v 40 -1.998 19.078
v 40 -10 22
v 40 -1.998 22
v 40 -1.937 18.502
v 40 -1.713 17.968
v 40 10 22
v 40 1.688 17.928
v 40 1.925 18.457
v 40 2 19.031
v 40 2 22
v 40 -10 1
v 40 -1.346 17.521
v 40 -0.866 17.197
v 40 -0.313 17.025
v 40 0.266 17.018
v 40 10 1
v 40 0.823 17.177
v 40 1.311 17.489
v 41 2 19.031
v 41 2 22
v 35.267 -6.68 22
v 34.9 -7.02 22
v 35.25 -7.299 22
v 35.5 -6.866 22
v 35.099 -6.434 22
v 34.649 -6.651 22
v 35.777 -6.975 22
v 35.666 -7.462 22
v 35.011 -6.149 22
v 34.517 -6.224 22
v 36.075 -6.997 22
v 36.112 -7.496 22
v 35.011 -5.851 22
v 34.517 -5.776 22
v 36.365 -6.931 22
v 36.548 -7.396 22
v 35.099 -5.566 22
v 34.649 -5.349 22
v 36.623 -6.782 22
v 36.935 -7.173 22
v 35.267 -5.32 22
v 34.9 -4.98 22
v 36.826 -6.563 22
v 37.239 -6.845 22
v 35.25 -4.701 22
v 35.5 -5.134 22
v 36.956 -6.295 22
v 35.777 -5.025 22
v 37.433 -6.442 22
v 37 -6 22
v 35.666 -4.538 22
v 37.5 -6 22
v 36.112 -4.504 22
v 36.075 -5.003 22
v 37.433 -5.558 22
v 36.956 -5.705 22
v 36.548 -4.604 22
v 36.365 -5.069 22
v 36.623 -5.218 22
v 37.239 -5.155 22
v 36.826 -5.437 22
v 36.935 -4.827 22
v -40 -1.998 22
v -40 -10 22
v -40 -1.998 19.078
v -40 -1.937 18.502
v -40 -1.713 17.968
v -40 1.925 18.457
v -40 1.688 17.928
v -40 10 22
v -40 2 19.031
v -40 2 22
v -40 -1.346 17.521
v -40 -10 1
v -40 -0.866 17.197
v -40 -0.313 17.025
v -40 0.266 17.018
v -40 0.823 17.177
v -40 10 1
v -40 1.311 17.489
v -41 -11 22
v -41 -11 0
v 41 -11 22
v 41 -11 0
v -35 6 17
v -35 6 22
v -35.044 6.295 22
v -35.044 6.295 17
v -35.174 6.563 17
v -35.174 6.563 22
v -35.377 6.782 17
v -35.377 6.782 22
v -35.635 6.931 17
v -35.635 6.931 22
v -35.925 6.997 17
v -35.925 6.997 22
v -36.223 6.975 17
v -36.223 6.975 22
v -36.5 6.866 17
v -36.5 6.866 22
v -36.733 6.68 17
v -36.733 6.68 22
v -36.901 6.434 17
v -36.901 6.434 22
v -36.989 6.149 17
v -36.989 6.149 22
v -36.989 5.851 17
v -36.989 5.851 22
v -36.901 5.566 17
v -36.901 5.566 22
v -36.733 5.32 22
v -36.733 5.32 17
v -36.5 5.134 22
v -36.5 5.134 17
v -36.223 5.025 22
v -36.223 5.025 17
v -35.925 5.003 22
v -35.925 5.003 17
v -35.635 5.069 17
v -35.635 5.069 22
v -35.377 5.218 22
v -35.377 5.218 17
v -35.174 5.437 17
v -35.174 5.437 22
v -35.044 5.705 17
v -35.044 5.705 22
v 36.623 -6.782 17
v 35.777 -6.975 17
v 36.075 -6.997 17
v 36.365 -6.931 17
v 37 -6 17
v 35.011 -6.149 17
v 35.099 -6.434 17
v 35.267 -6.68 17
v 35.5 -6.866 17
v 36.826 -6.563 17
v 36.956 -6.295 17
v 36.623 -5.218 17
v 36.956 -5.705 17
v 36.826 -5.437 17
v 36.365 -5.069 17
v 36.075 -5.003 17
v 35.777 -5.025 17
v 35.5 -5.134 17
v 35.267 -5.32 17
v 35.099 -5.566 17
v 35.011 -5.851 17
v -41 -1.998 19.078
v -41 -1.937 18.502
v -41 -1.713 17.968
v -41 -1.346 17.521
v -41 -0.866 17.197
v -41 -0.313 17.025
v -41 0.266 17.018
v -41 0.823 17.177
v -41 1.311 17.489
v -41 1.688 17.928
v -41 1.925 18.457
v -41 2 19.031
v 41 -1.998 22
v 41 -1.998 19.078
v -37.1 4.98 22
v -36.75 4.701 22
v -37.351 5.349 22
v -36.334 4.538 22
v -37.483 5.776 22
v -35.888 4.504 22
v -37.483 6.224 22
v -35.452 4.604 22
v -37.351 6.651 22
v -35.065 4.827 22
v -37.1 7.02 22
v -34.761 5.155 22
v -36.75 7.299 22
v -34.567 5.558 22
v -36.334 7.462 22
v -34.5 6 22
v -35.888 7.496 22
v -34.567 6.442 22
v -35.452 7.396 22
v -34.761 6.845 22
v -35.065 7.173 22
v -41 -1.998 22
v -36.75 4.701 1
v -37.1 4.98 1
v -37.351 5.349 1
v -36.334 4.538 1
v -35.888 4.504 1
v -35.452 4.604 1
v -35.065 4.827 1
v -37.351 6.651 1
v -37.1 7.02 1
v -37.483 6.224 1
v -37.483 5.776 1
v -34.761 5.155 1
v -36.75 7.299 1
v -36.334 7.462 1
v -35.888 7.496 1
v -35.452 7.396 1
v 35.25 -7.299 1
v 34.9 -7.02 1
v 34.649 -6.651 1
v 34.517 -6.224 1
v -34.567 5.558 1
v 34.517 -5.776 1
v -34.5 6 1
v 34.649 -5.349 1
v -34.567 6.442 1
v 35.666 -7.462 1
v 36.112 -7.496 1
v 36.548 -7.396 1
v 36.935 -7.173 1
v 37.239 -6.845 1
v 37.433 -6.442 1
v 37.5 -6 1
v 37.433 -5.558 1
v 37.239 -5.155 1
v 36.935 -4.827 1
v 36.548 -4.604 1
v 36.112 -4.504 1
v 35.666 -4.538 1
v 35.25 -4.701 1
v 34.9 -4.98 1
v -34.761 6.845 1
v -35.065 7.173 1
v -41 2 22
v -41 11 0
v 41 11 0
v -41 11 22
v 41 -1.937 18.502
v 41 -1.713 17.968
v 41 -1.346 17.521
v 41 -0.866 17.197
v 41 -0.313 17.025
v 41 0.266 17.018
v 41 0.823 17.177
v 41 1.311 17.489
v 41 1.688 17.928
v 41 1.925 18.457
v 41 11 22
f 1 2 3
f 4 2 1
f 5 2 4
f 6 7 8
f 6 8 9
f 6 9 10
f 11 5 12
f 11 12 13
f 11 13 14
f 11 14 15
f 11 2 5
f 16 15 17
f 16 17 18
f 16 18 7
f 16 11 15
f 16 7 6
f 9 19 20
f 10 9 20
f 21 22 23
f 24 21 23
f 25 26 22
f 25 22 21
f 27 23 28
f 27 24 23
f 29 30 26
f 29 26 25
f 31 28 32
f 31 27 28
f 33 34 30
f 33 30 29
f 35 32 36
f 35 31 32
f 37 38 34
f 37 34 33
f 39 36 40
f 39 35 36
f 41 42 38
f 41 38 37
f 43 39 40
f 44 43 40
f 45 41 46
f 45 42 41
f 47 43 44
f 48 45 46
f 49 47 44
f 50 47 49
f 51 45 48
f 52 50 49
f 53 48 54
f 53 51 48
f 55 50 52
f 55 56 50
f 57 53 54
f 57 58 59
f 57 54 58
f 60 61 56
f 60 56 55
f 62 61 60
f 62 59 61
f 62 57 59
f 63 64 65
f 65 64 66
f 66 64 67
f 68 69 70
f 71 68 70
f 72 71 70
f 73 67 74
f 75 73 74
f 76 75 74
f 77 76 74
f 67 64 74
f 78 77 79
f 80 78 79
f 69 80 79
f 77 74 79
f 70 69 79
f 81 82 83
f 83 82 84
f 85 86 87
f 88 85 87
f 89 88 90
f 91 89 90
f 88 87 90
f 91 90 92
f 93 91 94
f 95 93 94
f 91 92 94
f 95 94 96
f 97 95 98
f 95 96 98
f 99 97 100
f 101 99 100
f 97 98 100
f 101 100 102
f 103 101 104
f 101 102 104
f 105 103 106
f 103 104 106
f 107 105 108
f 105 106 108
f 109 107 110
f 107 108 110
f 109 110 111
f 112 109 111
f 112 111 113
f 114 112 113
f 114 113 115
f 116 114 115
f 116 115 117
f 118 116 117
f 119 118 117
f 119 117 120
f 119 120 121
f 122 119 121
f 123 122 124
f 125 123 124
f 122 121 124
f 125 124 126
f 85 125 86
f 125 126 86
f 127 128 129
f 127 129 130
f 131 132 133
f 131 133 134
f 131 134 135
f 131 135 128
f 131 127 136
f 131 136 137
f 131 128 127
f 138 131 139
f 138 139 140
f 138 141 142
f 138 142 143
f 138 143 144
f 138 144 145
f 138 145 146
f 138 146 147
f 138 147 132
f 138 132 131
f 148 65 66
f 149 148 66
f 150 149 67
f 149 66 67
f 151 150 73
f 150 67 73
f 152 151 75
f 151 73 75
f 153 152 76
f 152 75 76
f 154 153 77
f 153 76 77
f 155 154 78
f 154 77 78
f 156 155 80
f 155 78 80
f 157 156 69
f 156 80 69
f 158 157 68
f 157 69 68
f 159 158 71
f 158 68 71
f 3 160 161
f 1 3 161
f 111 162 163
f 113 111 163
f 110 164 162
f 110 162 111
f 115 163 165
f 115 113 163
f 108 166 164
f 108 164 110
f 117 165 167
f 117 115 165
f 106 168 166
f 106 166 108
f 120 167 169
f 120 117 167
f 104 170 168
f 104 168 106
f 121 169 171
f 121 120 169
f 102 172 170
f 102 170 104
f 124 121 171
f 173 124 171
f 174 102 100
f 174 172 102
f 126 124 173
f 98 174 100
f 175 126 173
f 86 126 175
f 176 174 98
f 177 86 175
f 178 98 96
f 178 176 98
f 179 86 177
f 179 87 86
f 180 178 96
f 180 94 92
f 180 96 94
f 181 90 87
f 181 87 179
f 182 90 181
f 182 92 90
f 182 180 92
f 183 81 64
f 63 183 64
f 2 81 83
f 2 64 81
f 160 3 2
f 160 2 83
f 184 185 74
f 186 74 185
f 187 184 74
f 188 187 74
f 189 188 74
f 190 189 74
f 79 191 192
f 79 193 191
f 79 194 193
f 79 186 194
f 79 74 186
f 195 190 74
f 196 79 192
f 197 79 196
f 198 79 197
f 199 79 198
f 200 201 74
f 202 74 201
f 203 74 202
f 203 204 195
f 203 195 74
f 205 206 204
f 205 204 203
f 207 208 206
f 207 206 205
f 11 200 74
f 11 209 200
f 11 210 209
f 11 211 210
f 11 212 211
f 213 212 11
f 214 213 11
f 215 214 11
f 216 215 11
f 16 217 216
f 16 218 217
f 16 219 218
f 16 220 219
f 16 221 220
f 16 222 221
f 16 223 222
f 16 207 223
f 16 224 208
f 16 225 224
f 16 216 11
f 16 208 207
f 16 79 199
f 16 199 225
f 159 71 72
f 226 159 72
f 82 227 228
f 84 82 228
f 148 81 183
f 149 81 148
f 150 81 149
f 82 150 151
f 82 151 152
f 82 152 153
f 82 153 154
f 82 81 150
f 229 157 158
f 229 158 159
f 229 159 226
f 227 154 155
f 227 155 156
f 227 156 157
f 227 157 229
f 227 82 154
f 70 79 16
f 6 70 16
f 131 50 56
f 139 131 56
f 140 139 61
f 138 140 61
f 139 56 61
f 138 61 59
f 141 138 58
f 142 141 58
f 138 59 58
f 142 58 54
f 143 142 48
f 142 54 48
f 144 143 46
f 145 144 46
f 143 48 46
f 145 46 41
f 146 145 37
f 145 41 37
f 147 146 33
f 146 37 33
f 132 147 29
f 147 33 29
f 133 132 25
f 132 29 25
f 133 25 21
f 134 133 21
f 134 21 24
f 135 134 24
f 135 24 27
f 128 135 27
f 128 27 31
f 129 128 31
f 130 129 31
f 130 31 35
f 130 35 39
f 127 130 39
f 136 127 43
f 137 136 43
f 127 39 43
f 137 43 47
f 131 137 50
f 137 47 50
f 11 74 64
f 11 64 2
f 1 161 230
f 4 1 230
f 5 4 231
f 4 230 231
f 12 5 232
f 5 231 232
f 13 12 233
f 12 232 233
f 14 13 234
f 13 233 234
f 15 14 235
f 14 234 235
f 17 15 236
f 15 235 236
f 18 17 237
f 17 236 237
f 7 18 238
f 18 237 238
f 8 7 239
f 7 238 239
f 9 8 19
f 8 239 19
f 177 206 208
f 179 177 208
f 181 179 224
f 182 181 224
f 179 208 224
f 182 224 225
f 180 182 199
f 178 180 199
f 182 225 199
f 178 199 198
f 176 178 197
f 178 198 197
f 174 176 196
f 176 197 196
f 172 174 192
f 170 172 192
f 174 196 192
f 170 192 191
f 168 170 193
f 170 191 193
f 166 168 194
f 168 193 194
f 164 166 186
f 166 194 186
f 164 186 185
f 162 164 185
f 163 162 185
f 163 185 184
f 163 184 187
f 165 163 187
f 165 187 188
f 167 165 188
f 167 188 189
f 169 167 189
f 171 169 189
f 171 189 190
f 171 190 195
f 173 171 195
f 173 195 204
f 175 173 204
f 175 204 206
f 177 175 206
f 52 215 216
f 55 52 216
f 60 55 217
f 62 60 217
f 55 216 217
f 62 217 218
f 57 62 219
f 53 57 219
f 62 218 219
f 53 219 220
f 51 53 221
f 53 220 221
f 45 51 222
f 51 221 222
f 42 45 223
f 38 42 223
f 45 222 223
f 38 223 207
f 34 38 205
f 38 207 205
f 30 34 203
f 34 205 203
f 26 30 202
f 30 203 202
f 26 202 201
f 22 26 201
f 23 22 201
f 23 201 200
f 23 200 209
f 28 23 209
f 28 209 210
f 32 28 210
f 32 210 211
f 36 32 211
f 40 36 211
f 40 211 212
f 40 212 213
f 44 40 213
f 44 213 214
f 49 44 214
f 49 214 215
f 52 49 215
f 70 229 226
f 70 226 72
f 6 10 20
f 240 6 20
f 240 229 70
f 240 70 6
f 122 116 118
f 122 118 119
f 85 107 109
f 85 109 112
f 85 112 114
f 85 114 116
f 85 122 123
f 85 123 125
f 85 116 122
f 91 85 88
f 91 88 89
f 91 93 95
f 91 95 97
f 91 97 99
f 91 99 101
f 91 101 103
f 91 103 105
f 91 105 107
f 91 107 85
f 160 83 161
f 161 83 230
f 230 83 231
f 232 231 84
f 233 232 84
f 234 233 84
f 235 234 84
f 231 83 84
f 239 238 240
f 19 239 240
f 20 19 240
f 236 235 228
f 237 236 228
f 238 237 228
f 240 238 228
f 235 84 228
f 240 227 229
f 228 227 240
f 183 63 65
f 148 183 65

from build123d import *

# Parameters (mm, degrees)
F0_W     = 80
F0_H     = 20
F0_R     = 1.5
F1_DEPTH = 1
F0_W_2   = 82
F0_H_2   = 22
F2_DEPTH = 22
F3_R     = 1
F4_DEPTH = 5
F6_DEPTH = 100


with BuildPart() as f1:
    # F0 (on Top) → F1 (new body)
    with BuildSketch(Plane.XY):
        Rectangle(F0_W, F0_H)
        with Locations((36, -6)):
            Circle(F0_R, mode=Mode.SUBTRACT)
        with Locations((-36, 6)):
            Circle(F0_R, mode=Mode.SUBTRACT)
    extrude(amount=F1_DEPTH)

    # F0 (on Top) → F2 (join)
    with BuildSketch(Plane.XY):
        Rectangle(F0_W_2, F0_H_2)
        Rectangle(F0_W, F0_H, mode=Mode.SUBTRACT)
        with Locations((-36, 6)):
            Circle(F0_R)
        with Locations((36, -6)):
            Circle(F0_R)
    extrude(amount=F2_DEPTH)

    # F3 (on face) → F4 (cut)
    with BuildSketch(Plane.XY.offset(22)):
        with Locations((36, -6)):
            Circle(F3_R)
        with Locations((-36, 6)):
            Circle(F3_R)
    extrude(amount=-F4_DEPTH, mode=Mode.SUBTRACT)

    # F5 (on face) → F6 (cut)
    with BuildSketch(Plane.YZ.offset(41)):
        with BuildLine():
            Line((-1.998466, 22), (-1.998466, 19.07831))
            ThreePointArc((-1.998466, 19.07831), (-0.023735, 17.000141), (1.999762, 19.030858))
            Line((1.999762, 19.030858), (1.999762, 22))
            Line((1.999762, 22), (-1.998466, 22))
        make_face()
    extrude(amount=-F6_DEPTH, mode=Mode.SUBTRACT)


solid = f1.part
